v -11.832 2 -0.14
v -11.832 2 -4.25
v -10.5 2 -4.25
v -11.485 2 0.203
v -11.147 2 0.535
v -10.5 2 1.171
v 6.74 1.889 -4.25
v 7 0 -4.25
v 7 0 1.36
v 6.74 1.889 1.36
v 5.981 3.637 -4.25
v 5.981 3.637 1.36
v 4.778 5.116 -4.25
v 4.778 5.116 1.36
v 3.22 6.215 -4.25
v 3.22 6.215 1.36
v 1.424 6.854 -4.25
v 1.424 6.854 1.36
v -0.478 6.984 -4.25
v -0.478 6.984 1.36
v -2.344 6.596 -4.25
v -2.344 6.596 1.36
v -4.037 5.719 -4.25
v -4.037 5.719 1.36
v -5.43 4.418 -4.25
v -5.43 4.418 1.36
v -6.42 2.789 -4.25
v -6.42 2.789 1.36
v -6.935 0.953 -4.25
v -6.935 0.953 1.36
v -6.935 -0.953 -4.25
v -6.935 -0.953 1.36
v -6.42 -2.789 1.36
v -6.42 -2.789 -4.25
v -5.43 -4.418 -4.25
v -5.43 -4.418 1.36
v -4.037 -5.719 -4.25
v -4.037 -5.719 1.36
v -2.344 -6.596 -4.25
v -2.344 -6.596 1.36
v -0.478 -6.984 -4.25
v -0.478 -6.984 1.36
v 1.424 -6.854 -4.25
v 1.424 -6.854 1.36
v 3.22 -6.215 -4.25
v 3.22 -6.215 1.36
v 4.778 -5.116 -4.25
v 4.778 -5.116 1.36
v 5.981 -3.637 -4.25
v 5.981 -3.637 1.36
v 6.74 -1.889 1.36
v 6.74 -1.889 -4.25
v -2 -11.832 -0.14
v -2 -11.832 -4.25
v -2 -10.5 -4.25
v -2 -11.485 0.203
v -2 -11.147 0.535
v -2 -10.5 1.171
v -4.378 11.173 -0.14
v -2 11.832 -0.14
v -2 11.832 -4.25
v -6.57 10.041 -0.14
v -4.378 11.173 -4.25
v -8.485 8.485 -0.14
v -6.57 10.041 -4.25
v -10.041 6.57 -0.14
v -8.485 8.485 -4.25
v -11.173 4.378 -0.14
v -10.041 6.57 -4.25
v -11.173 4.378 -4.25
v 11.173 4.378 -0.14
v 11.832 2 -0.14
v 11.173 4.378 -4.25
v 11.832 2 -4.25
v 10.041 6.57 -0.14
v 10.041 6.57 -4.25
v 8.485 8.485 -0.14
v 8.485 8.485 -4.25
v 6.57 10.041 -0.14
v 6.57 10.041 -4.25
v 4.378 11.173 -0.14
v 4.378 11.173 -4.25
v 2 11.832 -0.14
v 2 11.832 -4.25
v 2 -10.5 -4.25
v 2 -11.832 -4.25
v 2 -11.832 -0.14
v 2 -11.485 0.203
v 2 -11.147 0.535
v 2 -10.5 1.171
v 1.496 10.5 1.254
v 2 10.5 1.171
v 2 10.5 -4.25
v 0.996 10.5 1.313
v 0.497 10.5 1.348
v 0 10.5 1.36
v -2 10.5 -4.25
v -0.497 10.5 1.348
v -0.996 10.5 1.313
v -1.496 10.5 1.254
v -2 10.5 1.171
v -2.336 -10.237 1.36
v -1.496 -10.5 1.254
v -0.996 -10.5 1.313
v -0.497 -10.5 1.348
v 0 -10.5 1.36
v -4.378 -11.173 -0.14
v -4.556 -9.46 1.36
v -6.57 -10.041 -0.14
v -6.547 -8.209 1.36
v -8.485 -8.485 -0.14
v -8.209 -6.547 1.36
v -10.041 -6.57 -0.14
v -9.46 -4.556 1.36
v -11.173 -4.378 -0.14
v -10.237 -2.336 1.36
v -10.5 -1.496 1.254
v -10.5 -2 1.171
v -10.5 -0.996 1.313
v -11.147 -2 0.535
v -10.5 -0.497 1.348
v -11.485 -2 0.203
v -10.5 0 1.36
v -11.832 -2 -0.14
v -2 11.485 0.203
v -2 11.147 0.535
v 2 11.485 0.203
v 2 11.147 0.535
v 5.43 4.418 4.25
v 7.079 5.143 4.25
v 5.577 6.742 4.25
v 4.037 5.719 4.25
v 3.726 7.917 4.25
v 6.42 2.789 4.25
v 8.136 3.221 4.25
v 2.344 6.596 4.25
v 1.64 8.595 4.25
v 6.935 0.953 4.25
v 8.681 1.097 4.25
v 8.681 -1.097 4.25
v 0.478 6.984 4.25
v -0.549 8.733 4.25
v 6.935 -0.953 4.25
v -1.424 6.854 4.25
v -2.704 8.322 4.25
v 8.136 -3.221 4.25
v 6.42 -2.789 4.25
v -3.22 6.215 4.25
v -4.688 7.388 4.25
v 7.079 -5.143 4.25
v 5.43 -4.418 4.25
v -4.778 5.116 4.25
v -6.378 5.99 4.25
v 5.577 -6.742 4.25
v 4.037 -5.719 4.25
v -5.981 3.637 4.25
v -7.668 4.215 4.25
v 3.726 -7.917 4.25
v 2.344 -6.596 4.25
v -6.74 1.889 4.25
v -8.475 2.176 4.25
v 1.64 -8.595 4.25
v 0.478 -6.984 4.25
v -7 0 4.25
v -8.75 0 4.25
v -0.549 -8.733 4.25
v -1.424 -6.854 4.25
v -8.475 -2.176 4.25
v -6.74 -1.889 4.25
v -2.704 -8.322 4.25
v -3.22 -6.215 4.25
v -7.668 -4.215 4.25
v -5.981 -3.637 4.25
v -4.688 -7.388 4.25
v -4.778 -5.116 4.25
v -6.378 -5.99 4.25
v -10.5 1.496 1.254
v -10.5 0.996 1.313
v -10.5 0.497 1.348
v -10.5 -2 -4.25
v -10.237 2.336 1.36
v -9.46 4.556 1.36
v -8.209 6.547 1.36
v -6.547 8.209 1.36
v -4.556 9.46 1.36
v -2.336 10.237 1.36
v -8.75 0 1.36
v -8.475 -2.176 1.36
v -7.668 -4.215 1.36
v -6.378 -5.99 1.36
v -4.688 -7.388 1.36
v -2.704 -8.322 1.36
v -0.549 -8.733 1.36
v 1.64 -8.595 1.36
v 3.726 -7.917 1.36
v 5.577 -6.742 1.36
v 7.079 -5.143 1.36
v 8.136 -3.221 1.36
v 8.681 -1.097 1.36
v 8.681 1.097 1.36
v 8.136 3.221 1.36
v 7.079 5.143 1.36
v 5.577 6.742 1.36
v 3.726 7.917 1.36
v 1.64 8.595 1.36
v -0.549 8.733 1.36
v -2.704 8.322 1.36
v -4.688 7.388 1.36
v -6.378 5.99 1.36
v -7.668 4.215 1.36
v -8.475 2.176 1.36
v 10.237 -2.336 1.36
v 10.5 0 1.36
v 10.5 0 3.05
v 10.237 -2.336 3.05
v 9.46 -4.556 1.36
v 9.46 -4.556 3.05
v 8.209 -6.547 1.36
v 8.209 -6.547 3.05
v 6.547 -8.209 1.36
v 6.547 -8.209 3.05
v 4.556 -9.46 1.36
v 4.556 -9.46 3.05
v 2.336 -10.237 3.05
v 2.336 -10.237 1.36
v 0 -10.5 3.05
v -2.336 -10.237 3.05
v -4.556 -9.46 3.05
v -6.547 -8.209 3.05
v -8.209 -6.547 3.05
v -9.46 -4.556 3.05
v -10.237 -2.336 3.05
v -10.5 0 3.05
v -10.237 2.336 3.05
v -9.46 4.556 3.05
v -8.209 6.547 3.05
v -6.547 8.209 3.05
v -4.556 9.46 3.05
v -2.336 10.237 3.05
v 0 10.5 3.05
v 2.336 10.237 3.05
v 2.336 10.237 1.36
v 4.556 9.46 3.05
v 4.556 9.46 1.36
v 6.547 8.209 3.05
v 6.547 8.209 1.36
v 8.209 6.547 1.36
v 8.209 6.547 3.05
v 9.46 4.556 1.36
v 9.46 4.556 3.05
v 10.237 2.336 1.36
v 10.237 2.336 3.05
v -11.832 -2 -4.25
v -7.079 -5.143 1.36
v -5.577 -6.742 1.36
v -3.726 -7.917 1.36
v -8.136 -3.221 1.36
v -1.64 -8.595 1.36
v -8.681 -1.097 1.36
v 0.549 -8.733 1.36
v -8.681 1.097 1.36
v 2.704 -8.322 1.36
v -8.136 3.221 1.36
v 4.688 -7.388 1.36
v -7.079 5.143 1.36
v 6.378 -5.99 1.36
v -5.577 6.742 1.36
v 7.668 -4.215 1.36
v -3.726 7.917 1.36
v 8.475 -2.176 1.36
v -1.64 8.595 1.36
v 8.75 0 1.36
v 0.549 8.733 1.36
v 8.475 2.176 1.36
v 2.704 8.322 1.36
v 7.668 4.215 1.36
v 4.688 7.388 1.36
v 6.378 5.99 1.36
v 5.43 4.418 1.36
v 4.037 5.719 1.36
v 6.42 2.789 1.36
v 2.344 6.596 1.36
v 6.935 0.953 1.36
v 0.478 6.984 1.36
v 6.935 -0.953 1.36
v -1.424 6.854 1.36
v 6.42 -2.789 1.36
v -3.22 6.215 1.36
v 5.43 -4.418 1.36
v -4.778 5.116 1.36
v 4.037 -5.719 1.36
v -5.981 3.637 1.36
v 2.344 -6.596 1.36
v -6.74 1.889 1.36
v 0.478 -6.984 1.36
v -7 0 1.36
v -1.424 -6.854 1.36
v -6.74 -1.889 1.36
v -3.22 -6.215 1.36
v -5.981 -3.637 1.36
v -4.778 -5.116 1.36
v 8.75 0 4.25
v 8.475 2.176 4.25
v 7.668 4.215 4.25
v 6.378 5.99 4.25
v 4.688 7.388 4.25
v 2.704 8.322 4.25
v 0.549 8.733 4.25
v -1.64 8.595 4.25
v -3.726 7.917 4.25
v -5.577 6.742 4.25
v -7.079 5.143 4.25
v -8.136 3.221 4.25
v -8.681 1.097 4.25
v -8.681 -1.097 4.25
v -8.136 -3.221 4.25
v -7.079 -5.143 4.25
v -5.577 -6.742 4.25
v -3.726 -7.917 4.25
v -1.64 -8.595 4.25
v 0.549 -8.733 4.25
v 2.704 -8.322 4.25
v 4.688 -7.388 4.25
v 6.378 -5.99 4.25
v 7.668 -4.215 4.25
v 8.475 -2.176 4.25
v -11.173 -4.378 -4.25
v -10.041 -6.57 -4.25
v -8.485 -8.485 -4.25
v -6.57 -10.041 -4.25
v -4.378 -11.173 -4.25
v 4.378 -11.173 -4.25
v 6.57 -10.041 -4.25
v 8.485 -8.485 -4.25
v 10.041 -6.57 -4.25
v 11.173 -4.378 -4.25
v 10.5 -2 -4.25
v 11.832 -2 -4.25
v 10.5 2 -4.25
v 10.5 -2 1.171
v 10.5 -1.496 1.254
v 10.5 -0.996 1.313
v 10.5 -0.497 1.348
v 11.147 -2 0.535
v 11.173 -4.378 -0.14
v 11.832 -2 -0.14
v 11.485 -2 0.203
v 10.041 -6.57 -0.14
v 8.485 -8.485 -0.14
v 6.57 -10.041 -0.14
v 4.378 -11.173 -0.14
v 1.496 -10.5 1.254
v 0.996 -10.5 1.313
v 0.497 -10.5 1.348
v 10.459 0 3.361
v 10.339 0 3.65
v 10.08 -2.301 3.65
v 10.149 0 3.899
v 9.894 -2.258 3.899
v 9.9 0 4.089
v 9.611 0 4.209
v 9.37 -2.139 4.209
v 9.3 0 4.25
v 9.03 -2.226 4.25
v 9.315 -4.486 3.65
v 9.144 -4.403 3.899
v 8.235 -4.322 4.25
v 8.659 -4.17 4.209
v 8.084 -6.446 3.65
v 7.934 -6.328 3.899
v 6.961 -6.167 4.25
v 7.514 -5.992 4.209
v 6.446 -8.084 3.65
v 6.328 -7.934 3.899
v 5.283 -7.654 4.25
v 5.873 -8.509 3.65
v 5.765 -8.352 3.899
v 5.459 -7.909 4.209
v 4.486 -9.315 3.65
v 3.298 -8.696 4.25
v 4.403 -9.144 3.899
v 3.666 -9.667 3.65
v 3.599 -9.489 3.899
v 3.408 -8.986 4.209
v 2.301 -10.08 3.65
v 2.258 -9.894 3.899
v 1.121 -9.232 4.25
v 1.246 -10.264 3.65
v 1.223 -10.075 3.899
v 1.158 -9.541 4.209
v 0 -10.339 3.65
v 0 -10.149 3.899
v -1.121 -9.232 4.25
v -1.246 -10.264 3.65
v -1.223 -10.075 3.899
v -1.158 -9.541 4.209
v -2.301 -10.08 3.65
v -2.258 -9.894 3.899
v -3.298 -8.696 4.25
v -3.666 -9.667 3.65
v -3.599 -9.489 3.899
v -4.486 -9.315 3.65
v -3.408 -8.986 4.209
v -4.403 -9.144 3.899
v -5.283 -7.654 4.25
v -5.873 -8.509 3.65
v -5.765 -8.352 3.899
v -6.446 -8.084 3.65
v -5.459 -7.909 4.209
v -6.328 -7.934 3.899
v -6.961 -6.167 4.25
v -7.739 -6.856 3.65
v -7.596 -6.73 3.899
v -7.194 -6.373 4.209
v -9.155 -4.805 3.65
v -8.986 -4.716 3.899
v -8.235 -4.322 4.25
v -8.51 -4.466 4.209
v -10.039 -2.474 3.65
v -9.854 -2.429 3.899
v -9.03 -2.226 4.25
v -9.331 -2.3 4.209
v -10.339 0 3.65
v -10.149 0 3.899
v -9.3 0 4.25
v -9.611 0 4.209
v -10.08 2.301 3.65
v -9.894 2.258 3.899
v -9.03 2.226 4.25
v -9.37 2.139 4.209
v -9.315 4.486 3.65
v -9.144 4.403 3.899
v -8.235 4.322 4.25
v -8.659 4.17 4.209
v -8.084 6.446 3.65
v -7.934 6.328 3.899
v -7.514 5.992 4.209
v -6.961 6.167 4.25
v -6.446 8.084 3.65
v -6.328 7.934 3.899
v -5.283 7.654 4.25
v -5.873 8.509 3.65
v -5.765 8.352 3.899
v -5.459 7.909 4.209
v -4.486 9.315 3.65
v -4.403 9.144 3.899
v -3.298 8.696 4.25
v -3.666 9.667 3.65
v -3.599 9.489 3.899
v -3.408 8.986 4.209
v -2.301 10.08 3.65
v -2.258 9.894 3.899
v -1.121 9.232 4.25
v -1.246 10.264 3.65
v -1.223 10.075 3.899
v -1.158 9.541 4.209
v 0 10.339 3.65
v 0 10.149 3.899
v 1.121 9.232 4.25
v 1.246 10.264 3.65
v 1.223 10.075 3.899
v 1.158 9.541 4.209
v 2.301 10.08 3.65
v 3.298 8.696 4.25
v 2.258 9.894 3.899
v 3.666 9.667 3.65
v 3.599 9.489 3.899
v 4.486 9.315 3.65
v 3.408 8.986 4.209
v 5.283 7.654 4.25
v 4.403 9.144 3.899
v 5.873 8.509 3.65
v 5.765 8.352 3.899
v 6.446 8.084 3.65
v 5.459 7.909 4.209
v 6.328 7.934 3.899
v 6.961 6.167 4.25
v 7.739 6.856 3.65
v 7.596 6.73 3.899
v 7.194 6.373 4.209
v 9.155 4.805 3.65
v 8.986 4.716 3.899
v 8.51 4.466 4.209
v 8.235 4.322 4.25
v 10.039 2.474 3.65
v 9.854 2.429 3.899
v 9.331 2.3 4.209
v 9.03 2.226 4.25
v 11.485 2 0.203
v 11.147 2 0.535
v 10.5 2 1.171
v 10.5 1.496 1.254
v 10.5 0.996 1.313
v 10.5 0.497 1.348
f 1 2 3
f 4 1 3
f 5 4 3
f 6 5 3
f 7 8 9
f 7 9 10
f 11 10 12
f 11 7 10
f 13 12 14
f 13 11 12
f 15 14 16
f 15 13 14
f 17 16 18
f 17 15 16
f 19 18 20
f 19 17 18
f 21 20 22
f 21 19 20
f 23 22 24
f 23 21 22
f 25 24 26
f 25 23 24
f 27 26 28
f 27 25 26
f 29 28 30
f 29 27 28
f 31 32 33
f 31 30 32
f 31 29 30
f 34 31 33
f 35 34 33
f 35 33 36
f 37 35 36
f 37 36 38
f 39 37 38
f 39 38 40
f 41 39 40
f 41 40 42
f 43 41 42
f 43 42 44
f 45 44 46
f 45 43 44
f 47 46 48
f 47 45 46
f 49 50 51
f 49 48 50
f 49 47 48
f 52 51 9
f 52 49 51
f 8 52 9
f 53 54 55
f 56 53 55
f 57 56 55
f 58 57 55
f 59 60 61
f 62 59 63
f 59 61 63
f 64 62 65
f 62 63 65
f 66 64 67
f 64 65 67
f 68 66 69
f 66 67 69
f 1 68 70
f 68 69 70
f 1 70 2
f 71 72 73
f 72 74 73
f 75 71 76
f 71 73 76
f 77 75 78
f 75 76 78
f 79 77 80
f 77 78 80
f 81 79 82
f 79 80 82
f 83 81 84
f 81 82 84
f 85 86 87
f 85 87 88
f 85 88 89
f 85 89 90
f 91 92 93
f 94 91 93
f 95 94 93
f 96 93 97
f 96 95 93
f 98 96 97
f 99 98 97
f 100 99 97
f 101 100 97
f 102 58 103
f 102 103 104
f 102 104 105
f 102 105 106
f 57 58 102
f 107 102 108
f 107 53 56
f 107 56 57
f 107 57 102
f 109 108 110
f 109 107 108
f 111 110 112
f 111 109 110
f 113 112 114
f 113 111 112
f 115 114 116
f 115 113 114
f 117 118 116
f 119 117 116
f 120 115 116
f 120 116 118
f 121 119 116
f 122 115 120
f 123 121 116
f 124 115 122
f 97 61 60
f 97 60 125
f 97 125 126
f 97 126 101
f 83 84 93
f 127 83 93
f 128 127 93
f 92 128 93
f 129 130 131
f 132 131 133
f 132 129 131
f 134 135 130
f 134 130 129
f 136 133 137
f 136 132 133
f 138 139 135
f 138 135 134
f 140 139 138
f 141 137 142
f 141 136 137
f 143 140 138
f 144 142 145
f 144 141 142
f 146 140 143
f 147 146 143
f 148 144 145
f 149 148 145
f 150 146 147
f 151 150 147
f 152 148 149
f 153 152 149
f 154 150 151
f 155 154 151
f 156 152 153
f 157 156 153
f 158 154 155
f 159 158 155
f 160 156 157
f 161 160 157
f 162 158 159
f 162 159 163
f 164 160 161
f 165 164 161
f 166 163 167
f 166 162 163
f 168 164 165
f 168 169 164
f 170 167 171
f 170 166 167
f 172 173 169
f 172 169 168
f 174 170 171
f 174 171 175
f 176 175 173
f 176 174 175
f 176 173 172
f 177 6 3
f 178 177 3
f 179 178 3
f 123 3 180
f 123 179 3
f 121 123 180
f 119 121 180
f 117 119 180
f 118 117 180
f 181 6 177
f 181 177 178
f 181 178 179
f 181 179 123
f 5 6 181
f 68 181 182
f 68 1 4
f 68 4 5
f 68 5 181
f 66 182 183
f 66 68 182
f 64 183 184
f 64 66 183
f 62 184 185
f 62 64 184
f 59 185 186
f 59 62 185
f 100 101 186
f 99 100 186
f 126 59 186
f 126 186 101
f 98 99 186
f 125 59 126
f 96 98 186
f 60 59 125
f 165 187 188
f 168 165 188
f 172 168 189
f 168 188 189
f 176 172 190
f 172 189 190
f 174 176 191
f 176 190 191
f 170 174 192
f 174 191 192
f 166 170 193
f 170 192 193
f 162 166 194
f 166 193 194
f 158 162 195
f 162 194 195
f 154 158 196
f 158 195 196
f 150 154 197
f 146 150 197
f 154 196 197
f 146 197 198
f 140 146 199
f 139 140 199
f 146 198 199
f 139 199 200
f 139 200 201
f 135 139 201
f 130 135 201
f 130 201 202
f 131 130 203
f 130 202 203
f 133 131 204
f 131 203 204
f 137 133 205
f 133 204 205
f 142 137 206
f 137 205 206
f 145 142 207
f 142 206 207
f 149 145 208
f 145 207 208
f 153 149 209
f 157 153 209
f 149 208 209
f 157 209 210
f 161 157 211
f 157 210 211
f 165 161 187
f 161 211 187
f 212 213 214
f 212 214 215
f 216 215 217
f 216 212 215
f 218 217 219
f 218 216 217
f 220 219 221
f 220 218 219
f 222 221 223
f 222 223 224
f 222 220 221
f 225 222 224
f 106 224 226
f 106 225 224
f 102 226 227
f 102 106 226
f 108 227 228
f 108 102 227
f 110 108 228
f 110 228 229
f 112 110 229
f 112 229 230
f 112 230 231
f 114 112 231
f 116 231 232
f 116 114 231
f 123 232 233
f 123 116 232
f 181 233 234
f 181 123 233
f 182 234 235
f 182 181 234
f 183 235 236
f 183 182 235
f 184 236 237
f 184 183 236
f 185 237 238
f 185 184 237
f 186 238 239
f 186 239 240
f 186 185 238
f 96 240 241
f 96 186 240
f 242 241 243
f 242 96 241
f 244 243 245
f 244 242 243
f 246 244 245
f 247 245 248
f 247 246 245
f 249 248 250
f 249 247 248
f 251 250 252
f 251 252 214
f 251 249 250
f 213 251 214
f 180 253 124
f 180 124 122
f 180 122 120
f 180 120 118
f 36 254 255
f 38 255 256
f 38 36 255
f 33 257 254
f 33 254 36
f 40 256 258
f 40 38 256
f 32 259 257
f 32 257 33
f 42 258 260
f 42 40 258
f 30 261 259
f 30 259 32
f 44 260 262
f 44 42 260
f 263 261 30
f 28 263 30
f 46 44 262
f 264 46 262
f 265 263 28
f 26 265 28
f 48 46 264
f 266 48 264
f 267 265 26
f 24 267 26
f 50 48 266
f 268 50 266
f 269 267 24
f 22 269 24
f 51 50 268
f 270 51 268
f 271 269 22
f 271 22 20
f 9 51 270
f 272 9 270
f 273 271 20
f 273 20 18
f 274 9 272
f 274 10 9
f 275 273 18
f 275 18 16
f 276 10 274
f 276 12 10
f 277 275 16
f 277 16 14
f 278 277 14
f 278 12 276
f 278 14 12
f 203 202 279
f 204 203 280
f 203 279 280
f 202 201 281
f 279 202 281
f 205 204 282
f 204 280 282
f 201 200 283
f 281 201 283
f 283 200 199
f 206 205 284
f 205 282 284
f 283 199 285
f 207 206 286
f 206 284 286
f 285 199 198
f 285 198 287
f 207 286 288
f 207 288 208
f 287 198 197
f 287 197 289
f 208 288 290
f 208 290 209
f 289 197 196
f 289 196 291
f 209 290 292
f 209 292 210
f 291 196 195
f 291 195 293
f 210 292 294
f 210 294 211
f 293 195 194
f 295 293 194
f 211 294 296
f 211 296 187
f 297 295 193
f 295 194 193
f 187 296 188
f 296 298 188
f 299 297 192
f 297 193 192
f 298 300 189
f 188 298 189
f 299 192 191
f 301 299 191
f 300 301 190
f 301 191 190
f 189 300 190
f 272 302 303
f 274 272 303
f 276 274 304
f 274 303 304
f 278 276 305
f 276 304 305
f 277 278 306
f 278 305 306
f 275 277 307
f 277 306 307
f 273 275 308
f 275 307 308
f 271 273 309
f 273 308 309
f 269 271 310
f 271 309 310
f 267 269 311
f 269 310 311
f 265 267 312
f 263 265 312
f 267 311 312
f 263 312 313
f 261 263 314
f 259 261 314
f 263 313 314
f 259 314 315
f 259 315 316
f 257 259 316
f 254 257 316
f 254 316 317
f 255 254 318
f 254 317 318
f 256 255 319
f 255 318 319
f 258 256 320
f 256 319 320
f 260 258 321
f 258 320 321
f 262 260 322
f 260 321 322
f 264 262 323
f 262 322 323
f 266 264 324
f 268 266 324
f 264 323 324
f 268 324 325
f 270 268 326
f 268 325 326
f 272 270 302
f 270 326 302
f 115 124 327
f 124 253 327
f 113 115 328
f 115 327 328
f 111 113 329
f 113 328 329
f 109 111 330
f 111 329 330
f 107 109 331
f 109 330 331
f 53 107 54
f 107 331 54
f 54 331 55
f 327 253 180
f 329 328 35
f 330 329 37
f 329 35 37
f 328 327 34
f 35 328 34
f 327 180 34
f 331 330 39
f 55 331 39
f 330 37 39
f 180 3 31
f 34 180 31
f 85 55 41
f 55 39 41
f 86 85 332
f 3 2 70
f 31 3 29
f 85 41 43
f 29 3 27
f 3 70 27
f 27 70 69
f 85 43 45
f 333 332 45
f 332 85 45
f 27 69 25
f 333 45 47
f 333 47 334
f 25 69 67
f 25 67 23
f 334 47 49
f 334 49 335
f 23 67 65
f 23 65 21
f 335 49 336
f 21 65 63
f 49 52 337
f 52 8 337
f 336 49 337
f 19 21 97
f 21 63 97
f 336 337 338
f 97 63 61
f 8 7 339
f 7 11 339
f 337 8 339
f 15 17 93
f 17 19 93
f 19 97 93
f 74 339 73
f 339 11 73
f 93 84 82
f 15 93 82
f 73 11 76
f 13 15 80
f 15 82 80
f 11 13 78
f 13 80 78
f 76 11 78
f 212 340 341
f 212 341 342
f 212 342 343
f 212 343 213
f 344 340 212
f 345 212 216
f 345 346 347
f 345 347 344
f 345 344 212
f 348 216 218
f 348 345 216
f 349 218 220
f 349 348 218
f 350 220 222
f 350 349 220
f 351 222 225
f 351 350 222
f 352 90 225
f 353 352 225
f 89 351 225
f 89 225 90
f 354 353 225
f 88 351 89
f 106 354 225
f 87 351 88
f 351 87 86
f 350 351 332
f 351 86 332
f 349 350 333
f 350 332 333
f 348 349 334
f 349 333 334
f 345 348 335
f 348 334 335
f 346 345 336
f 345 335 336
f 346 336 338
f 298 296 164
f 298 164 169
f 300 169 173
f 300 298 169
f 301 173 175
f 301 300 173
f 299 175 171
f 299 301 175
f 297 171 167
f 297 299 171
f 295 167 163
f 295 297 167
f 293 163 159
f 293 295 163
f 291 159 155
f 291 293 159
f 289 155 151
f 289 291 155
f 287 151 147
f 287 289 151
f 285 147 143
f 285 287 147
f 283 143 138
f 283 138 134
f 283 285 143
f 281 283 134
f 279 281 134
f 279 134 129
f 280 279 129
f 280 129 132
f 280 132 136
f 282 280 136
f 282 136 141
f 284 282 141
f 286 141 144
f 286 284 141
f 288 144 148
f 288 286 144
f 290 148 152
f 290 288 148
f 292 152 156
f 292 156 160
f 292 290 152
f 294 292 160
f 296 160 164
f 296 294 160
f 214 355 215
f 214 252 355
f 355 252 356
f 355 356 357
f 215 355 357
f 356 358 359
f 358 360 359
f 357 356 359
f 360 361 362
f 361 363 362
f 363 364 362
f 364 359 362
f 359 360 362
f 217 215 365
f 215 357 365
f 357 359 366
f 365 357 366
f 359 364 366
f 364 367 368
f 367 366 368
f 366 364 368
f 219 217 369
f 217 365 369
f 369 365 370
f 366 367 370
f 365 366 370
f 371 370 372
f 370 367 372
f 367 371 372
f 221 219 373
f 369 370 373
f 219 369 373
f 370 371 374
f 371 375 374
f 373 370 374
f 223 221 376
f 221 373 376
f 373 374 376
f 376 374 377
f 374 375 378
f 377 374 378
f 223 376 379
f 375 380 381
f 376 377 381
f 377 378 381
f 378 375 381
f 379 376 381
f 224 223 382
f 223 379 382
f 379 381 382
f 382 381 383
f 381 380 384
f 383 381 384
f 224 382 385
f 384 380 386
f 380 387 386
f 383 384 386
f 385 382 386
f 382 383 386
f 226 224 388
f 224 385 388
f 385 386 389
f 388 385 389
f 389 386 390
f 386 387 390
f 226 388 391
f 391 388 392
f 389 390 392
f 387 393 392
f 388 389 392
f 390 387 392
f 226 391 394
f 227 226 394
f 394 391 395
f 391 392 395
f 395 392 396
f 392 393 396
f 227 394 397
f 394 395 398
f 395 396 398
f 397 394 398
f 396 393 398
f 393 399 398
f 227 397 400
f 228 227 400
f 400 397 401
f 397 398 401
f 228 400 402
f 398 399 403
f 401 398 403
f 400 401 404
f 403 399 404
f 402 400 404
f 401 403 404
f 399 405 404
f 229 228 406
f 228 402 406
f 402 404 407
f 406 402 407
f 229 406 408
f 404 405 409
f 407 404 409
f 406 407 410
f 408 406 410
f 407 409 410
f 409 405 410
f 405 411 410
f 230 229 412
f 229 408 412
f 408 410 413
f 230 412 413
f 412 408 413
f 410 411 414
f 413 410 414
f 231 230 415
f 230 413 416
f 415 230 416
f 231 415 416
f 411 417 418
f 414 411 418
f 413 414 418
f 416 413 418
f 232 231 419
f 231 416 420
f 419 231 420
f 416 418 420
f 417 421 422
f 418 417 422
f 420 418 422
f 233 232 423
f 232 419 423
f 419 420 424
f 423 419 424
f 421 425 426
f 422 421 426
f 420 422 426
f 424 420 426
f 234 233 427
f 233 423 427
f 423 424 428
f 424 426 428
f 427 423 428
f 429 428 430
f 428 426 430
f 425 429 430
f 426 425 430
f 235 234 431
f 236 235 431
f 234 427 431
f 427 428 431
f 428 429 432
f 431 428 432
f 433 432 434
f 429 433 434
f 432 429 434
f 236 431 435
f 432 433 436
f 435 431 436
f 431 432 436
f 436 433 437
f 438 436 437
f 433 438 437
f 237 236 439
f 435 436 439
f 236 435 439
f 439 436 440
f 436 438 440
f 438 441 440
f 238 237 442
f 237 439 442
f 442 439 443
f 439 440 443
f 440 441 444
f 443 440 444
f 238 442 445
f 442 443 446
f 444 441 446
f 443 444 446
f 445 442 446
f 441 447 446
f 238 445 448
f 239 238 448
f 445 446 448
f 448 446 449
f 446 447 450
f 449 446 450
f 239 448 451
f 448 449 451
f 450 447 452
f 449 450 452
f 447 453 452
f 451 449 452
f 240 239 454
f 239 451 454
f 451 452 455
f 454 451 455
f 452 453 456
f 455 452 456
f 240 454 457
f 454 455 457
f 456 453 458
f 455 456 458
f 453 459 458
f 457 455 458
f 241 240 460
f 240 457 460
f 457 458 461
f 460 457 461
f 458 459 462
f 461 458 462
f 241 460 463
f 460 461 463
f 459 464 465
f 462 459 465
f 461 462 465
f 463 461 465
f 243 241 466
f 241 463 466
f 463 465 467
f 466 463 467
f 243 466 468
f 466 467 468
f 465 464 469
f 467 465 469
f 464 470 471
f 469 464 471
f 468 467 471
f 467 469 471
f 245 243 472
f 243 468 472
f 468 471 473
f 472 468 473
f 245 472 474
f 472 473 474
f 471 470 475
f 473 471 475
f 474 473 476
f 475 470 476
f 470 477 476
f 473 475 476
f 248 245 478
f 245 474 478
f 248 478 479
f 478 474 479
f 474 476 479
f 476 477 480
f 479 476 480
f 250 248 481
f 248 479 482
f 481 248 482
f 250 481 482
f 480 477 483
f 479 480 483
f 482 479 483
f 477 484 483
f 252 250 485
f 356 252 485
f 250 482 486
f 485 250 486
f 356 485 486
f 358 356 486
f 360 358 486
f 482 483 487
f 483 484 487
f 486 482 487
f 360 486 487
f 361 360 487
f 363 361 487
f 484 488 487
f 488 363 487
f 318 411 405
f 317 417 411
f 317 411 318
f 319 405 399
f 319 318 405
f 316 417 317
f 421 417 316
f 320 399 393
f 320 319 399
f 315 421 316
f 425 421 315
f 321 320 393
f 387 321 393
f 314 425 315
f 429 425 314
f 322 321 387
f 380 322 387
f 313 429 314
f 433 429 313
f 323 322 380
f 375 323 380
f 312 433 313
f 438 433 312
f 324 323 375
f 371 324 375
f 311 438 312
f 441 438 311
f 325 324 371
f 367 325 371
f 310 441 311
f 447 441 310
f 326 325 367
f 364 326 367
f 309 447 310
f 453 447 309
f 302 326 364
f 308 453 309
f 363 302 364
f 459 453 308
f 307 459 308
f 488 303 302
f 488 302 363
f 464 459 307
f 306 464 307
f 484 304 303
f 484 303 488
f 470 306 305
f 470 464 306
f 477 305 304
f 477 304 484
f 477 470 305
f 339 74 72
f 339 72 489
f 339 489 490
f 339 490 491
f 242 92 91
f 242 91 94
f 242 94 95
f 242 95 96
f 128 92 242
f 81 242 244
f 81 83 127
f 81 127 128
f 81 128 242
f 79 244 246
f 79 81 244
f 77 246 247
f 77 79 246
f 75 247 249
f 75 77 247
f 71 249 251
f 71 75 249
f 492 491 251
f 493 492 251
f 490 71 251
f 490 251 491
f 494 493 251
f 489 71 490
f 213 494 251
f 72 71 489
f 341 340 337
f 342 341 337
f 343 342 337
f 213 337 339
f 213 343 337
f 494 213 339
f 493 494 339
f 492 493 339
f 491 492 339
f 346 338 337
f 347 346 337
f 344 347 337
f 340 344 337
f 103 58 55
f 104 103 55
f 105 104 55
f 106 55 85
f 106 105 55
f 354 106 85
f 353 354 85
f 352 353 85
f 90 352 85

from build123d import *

# Parameters (mm, degrees)
BOSS_EXTRUDE1_DEPTH      = 4.25
BOSS_EXTRUDE1_DEPTH_BACK = 4.25
SKETCH4_R                = 12
SKETCH4_R_2              = 7
SKETCH5_R                = 12
SKETCH5_R_2              = 10.5
CUT_EXTRUDE1_DEPTH       = 0.5
SKETCH16_W               = 4
SKETCH16_H               = 1.5
CUT_EXTRUDE7_DEPTH       = 18.494642037
CIRPATTERN1_COUNT        = 4
FILLET1_R                = 1.2
SKETCH19_R               = 8.75
CUT_EXTRUDE8_DEPTH       = 2.89
SKETCH20_R               = 8.75
SKETCH20_R_2             = 7
BOSS_EXTRUDE2_DEPTH      = 2.89


with BuildPart() as part:
    # Sketch4 → Boss-Extrude1 (new, two sides: drawn at the far end of the back side and taken through both)
    with BuildSketch(Plane.XY.offset(-BOSS_EXTRUDE1_DEPTH_BACK)):
        Circle(SKETCH4_R)
        Circle(SKETCH4_R_2, mode=Mode.SUBTRACT)
    extrude(amount=BOSS_EXTRUDE1_DEPTH + BOSS_EXTRUDE1_DEPTH_BACK)

    # Sketch5 → Cut-Extrude1 (cut)
    with BuildSketch(Plane.XY.offset(4.25)):
        Circle(SKETCH5_R)
        Circle(SKETCH5_R_2, mode=Mode.SUBTRACT)
    extrude(amount=-CUT_EXTRUDE1_DEPTH, mode=Mode.SUBTRACT)

    # Sketch16 → Cut-Extrude7 (cut, symmetric)
    with BuildSketch(Plane.XY):
        with Locations((0, -11.25)):
            Rectangle(SKETCH16_W, SKETCH16_H)
    cut_extrude7 = extrude(amount=CUT_EXTRUDE7_DEPTH, both=True, mode=Mode.SUBTRACT)

    # CirPattern1: Cut-Extrude7 ×4 about axis
    cirpattern1_axis = Axis((0, 0, 0), (0, 0, 1))
    for i in range(1, CIRPATTERN1_COUNT):
        add(cut_extrude7.rotate(cirpattern1_axis, i * 360 / CIRPATTERN1_COUNT), mode=Mode.SUBTRACT)

    # Sketch18 → Cut-Revolve1 (revolve, cut)
    with BuildSketch(Plane(origin=(0, 0, 0), x_dir=(0, 0, -1), z_dir=(1, 0, 0)), mode=Mode.PRIVATE) as cut_revolve1_sk:
        Polygon((-1.36, 10.5), (0.14, 12), (-4.25, 12), (-4.25, 10.5), align=None)
    revolve(cut_revolve1_sk.sketch.rotate(Axis((0, 0, 4.25), (0, 0, -1)), 90), axis=Axis((0, 0, 4.25), (0, 0, -1)), mode=Mode.SUBTRACT)

    # Fillet1
    fillet1_edges = [part.edges().sort_by_distance(p)[0] for p in [
        (-10.5, 0, 4.25),
    ]]
    fillet(fillet1_edges, radius=FILLET1_R)

    # Sketch19 → Cut-Extrude8 (cut)
    with BuildSketch(Plane.XY.offset(4.25)):
        Circle(SKETCH19_R)
    extrude(amount=-CUT_EXTRUDE8_DEPTH, mode=Mode.SUBTRACT)


with BuildPart() as body_2:
    # Sketch20 → Boss-Extrude2 (new body)
    with BuildSketch(Plane.XY.offset(1.36)):
        with Locations(Location((0, 0, 0), (0, 0, 180))):
            Circle(SKETCH20_R)
        with Locations(Location((0, 0, 0), (0, 0, 180))):
            Circle(SKETCH20_R_2, mode=Mode.SUBTRACT)
    extrude(amount=BOSS_EXTRUDE2_DEPTH)


solid = Compound([part.part, body_2.part])
